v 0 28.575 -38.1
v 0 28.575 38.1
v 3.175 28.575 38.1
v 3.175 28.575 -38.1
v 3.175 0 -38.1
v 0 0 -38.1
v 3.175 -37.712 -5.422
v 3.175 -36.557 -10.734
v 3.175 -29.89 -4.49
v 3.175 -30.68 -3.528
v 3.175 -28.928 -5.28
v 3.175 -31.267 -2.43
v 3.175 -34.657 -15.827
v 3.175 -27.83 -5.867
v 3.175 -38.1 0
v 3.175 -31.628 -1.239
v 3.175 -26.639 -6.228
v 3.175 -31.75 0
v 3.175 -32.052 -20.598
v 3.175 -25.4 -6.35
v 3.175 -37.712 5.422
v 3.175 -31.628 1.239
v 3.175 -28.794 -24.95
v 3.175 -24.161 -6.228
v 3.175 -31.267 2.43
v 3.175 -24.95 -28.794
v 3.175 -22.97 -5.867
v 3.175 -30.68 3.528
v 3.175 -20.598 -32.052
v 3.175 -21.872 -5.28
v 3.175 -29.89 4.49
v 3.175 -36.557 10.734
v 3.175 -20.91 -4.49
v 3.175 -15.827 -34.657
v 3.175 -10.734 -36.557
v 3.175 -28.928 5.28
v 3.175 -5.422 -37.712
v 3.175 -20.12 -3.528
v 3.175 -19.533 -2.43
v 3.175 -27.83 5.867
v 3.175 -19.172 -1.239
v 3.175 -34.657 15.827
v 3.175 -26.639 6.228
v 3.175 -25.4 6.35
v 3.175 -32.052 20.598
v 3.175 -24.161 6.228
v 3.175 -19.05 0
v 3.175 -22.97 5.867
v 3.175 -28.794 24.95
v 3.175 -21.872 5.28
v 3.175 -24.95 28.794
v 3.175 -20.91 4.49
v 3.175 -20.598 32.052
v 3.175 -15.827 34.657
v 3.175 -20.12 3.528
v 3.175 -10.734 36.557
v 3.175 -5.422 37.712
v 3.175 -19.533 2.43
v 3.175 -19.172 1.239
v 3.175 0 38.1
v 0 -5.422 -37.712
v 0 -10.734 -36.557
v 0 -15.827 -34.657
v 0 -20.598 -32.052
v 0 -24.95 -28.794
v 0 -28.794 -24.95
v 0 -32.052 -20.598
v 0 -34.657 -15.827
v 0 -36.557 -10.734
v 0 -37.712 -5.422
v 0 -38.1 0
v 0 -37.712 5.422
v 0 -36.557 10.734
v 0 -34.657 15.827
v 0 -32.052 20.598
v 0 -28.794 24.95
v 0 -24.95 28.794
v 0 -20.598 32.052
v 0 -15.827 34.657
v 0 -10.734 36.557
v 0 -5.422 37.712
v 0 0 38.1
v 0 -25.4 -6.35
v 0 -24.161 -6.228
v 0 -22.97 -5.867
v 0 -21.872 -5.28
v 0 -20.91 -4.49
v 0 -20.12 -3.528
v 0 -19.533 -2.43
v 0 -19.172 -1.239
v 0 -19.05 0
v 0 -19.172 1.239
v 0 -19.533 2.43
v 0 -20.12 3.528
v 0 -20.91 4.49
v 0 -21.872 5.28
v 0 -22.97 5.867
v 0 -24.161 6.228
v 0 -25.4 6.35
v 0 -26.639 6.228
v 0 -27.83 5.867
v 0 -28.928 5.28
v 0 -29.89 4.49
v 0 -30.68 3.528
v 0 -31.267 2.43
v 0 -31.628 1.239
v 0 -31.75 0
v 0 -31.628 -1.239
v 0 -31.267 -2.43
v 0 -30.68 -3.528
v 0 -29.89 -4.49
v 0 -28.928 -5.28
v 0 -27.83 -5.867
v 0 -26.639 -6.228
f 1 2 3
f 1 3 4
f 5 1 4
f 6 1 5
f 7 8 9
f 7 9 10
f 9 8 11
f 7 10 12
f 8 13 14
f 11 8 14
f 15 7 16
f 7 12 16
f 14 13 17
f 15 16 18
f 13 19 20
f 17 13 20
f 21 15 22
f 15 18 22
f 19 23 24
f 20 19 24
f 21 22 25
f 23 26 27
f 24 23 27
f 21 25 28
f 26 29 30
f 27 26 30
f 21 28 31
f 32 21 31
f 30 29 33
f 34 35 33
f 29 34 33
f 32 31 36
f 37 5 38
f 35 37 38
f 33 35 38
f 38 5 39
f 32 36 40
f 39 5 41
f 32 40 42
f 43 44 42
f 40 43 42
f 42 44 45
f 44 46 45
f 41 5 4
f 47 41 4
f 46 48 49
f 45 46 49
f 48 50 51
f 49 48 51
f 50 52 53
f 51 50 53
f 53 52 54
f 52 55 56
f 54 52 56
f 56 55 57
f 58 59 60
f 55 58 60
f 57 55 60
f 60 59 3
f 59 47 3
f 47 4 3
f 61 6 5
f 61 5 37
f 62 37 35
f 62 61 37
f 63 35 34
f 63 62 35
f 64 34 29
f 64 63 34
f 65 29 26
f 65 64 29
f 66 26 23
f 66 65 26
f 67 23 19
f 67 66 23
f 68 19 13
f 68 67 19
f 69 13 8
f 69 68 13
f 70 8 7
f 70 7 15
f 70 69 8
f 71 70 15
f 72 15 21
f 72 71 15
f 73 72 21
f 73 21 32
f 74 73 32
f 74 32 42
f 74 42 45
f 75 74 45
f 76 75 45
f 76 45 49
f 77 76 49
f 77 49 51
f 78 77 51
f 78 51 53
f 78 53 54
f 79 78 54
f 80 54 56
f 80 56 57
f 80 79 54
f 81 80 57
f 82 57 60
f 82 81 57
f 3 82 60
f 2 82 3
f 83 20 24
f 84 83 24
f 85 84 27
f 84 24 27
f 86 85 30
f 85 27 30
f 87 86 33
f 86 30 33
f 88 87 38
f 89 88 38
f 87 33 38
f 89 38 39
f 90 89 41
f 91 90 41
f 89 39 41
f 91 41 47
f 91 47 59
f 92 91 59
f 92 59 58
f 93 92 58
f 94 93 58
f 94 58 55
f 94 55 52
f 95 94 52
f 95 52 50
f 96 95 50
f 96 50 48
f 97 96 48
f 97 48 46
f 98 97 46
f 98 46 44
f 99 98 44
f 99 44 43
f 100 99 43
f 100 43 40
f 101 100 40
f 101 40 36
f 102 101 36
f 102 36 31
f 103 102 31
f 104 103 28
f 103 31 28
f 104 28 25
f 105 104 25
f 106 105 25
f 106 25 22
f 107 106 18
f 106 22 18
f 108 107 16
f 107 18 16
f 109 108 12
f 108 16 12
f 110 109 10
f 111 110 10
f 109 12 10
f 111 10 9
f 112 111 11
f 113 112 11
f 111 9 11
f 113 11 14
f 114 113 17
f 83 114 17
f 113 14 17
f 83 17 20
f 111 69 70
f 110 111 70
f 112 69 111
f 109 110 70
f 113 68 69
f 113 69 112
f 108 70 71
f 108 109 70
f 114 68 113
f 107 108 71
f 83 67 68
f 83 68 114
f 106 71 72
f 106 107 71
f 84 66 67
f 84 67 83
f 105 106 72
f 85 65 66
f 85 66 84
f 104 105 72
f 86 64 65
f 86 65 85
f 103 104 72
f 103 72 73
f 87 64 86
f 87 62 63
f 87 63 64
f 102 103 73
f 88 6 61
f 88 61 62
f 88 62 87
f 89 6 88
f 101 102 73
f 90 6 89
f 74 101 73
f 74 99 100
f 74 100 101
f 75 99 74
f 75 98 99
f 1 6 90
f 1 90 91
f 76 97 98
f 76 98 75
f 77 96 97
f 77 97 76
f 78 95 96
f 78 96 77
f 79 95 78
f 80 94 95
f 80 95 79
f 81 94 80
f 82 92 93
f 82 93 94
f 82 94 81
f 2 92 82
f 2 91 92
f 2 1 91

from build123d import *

# Parameters (mm, degrees)
BOSS_EXTRUDE1_DEPTH = 3.175
SKETCH2_R           = 6.35
CUT_EXTRUDE1_DEPTH  = 54.975


with BuildPart() as part:
    # Sketch1 → Boss-Extrude1 (new body)
    with BuildSketch(Plane(origin=(0, 0, 0), x_dir=(0, 0, -1), z_dir=(1, 0, 0))):
        with BuildLine():
            Line((-38.1, 0), (-38.1, 28.575))
            Line((-38.1, 28.575), (38.1, 28.575))
            Line((38.1, 28.575), (38.1, 0))
            ThreePointArc((38.1, 0), (0, -38.1), (-38.1, 0))
        make_face()
    extrude(amount=BOSS_EXTRUDE1_DEPTH)

    # Sketch2 → Cut-Extrude1 (cut, through all)
    with BuildSketch(Plane(origin=(3.175, 0, 0), x_dir=(0, 0, -1), z_dir=(1, 0, 0))):
        with Locations((0, -25.4)):
            Circle(SKETCH2_R)
    extrude(amount=-CUT_EXTRUDE1_DEPTH, mode=Mode.SUBTRACT)


solid = part.part
